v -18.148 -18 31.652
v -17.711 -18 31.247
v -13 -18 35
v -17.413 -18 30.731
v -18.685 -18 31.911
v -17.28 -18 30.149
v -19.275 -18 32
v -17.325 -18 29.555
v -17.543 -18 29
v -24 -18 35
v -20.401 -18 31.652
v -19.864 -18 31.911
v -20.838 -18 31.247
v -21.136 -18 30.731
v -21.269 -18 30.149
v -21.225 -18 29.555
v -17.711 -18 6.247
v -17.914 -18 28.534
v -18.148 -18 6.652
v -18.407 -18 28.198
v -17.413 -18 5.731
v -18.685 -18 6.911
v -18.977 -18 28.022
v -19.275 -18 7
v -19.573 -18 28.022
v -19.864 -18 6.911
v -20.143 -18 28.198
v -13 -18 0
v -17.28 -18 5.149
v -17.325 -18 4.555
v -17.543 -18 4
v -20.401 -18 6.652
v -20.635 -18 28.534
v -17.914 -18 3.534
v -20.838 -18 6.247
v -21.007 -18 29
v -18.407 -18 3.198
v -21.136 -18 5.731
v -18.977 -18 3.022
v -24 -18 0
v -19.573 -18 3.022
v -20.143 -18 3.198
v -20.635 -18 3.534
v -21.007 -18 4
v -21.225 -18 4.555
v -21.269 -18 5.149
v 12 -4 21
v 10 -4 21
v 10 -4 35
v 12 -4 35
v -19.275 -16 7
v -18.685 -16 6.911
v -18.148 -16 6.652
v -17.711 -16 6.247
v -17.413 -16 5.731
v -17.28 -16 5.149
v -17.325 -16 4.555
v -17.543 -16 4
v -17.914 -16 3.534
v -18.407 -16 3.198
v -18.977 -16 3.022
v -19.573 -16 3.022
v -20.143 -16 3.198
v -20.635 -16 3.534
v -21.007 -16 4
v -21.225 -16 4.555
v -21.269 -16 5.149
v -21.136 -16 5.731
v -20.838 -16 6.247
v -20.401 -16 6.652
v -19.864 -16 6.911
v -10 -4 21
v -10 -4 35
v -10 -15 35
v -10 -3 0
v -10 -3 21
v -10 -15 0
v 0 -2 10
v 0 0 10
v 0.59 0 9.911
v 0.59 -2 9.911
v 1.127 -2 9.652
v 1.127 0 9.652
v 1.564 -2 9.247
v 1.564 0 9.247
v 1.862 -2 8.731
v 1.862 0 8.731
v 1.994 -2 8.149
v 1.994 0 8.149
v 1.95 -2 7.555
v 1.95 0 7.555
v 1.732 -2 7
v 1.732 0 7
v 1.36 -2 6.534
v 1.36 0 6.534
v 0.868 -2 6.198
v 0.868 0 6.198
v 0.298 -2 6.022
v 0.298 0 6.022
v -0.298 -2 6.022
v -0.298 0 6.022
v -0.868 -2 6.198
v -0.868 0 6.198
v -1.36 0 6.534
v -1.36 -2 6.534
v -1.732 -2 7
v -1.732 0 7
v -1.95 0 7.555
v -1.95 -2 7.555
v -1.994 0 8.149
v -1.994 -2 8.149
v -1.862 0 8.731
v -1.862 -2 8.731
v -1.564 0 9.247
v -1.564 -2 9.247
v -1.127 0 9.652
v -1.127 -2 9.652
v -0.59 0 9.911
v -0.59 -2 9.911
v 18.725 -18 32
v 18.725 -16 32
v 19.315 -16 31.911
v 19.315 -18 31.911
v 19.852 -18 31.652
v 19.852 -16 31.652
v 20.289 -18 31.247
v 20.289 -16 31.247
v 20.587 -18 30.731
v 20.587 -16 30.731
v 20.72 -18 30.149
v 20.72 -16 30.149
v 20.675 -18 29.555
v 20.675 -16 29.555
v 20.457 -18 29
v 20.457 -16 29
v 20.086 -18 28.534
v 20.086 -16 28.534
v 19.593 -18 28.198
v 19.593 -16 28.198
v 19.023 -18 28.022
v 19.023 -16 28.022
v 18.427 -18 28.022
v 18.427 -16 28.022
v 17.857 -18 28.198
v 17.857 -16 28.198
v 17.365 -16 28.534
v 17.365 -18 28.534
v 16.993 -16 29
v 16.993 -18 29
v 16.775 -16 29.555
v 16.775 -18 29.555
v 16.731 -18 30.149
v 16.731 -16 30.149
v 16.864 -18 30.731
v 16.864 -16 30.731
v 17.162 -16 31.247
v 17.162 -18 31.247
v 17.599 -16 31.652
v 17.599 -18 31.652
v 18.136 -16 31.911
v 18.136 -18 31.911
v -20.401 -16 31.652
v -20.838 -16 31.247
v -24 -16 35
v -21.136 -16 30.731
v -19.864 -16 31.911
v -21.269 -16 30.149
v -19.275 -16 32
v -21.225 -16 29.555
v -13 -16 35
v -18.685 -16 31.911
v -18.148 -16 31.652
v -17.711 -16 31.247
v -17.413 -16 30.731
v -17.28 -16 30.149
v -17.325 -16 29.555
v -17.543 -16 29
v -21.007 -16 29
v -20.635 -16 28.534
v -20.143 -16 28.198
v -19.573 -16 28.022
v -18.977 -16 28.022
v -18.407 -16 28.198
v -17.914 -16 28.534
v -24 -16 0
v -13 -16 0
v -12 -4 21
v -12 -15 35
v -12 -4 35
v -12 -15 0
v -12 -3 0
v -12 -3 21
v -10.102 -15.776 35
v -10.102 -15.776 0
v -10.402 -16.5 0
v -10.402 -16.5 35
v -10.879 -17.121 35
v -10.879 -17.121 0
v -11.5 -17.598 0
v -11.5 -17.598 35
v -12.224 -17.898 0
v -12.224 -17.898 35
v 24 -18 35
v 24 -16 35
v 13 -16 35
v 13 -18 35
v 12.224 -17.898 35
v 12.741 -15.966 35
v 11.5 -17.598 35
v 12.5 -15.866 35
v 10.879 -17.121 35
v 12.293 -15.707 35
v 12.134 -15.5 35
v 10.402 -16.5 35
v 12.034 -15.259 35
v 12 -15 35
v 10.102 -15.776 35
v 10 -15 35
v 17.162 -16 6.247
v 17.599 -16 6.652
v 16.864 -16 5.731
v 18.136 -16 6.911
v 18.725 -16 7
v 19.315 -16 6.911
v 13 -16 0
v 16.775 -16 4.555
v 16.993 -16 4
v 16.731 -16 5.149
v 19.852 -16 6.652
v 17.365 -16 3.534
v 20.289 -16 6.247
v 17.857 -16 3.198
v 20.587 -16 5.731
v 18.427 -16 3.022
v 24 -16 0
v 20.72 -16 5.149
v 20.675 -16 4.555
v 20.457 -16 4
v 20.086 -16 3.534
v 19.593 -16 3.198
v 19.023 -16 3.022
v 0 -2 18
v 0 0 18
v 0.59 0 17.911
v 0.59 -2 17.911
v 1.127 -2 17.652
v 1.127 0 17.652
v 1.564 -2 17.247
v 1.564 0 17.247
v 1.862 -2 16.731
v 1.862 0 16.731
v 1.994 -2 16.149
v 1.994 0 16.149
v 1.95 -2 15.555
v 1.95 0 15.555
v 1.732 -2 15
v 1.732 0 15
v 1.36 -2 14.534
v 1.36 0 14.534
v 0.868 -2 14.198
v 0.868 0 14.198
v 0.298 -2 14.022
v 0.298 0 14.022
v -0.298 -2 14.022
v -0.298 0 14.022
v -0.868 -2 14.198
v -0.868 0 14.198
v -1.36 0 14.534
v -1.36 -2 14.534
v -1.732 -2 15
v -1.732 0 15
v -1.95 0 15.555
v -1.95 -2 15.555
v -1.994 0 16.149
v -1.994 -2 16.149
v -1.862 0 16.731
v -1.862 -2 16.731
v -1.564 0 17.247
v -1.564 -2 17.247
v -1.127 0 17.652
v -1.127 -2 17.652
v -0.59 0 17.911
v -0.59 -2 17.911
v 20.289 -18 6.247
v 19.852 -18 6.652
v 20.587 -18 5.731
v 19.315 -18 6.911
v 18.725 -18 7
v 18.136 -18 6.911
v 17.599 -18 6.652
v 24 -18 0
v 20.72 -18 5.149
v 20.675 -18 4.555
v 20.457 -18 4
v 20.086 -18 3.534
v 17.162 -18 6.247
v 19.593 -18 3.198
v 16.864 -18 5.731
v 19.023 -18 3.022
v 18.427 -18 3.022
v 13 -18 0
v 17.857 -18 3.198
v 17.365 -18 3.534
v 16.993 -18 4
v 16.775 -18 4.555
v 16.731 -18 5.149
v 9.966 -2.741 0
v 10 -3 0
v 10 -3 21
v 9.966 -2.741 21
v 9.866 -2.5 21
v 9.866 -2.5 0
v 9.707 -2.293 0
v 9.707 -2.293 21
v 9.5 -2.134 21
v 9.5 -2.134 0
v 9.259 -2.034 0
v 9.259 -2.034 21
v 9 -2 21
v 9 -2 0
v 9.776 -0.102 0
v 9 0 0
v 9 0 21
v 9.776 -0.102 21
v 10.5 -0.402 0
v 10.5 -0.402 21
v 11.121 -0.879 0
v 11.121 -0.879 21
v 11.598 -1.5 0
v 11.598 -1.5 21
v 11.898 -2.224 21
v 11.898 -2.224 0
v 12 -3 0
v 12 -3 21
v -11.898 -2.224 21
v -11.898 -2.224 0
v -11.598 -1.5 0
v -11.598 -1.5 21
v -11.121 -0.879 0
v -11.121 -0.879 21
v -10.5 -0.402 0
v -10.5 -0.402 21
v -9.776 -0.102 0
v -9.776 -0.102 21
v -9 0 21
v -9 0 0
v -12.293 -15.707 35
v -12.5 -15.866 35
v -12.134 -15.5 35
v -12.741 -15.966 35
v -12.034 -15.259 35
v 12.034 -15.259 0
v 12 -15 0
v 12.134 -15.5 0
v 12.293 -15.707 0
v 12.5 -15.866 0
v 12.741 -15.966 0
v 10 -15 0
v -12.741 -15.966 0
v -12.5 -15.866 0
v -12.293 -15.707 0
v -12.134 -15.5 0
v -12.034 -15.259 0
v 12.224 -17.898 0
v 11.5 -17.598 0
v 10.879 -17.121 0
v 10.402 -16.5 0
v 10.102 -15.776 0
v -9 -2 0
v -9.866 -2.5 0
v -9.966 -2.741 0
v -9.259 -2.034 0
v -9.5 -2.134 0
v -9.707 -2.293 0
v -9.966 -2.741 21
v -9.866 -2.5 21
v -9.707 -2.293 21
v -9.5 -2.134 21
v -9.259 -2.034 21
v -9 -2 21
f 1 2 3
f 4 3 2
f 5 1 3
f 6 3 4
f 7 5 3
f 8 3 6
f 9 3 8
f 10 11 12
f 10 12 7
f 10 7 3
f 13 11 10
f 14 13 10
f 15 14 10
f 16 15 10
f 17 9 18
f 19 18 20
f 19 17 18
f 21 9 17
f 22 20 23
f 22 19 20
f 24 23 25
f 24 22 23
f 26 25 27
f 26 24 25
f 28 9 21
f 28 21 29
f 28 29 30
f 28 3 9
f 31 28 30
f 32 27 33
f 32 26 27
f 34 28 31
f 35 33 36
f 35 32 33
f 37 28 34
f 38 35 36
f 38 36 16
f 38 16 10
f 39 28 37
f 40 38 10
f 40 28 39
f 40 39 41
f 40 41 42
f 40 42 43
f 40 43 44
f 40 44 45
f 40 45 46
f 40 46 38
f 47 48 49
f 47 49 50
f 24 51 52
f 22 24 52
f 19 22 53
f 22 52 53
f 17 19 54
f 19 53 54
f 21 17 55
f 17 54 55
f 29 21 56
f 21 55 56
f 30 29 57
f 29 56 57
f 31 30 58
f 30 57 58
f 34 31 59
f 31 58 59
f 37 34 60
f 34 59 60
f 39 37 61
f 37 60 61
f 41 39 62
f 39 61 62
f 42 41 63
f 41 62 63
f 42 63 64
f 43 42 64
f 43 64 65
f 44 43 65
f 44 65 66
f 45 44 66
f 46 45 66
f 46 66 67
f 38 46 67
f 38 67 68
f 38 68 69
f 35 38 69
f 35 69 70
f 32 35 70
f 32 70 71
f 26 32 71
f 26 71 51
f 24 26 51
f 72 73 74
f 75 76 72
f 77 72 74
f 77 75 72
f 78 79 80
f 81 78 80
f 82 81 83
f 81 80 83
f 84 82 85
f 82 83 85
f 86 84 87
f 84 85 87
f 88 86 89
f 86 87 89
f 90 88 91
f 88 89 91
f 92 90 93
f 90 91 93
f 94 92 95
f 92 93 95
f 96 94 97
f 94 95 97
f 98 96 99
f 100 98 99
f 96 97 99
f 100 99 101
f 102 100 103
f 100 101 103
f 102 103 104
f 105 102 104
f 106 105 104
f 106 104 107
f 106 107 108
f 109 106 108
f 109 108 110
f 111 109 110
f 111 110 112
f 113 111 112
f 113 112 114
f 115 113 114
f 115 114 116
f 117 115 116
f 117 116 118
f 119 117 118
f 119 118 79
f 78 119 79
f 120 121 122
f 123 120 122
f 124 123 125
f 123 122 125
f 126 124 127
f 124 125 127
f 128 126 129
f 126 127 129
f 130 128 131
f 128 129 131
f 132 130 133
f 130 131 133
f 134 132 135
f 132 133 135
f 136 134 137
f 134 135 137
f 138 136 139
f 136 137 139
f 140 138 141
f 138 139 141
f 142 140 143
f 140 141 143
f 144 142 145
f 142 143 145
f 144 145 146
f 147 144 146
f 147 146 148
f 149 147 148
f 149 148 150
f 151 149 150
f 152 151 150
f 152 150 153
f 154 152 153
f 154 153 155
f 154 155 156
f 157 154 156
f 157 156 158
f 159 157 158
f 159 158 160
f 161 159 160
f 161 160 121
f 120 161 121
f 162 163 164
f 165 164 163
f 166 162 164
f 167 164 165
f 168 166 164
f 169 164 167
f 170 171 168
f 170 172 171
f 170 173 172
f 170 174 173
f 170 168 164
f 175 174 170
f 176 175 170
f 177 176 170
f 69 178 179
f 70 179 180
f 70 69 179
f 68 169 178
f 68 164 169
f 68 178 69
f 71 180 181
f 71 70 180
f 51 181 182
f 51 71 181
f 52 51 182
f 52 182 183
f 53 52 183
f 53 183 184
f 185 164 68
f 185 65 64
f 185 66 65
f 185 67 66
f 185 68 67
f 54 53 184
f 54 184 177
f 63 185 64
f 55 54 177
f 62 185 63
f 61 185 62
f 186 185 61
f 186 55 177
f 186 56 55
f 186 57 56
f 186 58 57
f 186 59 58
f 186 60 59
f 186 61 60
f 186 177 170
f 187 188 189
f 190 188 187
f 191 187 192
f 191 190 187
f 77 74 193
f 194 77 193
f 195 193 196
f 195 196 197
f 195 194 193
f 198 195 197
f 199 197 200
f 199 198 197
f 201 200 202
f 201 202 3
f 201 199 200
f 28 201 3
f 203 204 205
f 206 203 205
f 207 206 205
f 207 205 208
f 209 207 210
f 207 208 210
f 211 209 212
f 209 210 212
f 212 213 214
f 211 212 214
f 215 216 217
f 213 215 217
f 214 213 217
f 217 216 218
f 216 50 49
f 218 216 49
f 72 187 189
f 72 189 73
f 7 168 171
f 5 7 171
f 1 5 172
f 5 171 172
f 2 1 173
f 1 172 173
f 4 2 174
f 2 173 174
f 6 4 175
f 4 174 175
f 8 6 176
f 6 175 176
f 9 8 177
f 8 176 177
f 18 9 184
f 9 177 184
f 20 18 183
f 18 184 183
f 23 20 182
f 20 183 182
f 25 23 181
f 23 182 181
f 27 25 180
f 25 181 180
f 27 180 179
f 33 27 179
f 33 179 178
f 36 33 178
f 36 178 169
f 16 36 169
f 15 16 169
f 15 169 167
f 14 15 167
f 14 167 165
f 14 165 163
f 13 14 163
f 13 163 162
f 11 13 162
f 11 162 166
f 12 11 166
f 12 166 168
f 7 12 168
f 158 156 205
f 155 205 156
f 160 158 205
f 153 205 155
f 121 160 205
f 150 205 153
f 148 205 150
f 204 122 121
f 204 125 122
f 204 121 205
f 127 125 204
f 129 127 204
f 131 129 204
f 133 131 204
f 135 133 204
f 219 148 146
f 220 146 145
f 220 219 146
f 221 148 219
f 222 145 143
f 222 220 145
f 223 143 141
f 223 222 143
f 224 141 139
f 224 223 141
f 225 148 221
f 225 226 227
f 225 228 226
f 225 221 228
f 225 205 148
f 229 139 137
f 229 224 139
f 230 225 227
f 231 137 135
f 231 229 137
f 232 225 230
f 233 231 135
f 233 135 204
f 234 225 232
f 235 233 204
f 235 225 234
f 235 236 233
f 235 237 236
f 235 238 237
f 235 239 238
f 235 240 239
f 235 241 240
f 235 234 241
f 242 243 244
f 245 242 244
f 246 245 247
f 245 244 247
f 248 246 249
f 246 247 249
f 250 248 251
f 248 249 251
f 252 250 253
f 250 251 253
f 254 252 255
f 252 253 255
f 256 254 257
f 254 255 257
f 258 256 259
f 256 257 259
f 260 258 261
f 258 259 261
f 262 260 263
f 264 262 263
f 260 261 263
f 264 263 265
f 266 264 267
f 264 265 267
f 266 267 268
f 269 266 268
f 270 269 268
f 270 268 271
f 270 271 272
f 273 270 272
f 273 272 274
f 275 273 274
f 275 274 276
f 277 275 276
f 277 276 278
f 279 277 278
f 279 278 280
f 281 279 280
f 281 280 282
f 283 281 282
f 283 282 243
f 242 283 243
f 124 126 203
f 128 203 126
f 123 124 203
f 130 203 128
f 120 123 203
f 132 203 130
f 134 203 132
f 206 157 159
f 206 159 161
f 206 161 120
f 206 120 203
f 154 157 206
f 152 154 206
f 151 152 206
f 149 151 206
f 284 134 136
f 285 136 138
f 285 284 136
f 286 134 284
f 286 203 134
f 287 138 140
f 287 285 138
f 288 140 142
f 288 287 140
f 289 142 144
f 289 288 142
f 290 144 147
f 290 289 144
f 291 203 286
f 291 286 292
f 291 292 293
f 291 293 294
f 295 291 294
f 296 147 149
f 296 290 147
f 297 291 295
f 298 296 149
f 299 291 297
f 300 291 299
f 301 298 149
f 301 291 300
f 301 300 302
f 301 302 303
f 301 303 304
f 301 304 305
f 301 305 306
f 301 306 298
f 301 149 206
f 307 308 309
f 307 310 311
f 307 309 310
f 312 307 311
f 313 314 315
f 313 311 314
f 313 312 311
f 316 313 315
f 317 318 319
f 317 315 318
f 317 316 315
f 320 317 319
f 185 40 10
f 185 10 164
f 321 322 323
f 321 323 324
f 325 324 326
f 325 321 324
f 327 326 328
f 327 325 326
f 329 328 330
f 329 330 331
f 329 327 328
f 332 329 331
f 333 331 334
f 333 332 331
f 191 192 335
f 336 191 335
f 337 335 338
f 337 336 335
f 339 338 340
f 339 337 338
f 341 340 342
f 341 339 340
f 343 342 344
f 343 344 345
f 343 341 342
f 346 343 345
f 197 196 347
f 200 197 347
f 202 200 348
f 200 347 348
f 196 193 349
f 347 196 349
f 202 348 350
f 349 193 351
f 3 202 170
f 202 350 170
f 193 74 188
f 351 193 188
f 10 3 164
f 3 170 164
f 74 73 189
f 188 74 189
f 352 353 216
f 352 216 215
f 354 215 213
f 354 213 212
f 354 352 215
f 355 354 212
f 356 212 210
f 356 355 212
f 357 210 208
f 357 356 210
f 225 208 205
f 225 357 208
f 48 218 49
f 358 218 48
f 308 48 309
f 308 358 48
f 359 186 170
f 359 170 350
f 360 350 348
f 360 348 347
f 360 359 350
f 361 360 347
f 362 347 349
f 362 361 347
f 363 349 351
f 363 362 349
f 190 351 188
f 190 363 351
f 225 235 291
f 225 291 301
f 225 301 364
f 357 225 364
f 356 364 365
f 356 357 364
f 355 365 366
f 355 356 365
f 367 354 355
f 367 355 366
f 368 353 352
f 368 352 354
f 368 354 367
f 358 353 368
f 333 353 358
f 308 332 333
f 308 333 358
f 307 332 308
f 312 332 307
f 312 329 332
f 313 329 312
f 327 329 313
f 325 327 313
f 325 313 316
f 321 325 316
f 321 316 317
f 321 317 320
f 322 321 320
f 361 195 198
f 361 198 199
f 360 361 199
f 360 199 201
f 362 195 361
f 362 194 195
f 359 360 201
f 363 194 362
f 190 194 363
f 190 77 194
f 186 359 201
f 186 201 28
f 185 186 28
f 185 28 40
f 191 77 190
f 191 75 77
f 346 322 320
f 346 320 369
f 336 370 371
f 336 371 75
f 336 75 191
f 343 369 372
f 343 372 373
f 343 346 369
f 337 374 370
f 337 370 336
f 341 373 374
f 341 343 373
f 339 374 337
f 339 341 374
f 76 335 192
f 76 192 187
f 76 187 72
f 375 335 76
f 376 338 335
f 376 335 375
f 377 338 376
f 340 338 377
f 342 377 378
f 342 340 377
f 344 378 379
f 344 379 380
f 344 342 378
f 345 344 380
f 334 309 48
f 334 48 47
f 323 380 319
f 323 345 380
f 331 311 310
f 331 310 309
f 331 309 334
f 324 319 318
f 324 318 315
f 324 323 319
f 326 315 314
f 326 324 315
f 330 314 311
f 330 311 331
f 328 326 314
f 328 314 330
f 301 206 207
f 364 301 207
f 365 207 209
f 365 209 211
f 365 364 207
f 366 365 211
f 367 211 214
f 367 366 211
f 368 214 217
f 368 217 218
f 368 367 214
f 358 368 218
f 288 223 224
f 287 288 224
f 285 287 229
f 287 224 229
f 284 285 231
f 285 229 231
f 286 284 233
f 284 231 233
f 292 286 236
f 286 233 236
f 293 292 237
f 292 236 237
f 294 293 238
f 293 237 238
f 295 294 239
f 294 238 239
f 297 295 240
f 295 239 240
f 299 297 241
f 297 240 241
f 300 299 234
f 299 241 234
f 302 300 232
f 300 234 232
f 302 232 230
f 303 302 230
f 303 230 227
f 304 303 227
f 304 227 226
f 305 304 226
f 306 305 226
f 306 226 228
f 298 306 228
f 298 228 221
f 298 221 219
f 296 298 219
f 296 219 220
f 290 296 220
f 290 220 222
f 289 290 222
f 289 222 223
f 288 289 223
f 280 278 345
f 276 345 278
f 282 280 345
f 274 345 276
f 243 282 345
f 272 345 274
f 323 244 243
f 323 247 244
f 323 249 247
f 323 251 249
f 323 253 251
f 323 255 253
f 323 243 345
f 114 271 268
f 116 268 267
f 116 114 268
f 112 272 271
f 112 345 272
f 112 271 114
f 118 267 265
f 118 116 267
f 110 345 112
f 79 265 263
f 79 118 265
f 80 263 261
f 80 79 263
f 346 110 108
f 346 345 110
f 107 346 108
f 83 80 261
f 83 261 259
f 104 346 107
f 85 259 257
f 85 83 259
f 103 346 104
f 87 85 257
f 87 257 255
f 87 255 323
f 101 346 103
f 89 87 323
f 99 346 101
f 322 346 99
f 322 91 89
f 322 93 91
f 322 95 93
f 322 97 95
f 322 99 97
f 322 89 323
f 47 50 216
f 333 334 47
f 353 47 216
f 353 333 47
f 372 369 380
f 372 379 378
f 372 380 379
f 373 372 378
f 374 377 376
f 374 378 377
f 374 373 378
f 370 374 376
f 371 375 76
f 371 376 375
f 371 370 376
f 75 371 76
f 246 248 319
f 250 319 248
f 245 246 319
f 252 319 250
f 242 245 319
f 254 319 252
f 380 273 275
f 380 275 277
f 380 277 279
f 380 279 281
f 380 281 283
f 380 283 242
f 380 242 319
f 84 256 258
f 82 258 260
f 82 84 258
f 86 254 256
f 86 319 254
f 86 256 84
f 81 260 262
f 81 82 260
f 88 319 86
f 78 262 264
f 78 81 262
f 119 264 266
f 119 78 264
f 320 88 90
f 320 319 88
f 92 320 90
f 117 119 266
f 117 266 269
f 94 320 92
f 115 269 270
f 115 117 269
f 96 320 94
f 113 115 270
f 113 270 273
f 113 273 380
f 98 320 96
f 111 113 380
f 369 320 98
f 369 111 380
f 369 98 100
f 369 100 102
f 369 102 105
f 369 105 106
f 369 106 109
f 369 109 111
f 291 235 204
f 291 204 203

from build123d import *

# Parameters (mm, degrees)
BASE_FLANGE2_DEPTH = 35
SKETCH12_W         = 24
SKETCH12_H         = 14
CUT_EXTRUDE1_DEPTH = 4
CUT_EXTRUDE2_REACH = 48.098
SKETCH13_R         = 2


# Sheet-metal steps are written as plain solids
with BuildPart() as part:
    # Sketch7 → Base-Flange2 (new body)
    with BuildSketch(Plane.XY):
        with BuildLine():
            Line((-24, -16), (-13, -16))
            ThreePointArc((-13, -16), (-12.292893219, -15.707106781), (-12, -15))
            Line((-12, -15), (-12, -3))
            ThreePointArc((-12, -3), (-11.121320344, -0.878679656), (-9, 0))
            Line((-9, 0), (9, 0))
            ThreePointArc((9, 0), (11.121320344, -0.878679656), (12, -3))
            Line((12, -3), (12, -15))
            ThreePointArc((12, -15), (12.292893219, -15.707106781), (13, -16))
            Line((13, -16), (24, -16))
            Line((24, -16), (24, -18))
            Line((24, -18), (13, -18))
            ThreePointArc((13, -18), (10.878679656, -17.121320344), (10, -15))
            Line((10, -15), (10, -3))
            ThreePointArc((10, -3), (9.707106781, -2.292893219), (9, -2))
            Line((9, -2), (-9, -2))
            ThreePointArc((-9, -2), (-9.707106781, -2.292893219), (-10, -3))
            Line((-10, -3), (-10, -15))
            ThreePointArc((-10, -15), (-10.878679656, -17.121320344), (-13, -18))
            Line((-13, -18), (-24, -18))
            Line((-24, -18), (-24, -16))
        make_face()
    extrude(amount=BASE_FLANGE2_DEPTH)

    # Sketch12 → Cut-Extrude1 (cut)
    with BuildSketch(Plane(origin=(0, 0, 0), x_dir=(1, 0, 0), z_dir=(0, 1, 0))):
        with Locations((0, -28)):
            Rectangle(SKETCH12_W, SKETCH12_H)
    extrude(amount=-CUT_EXTRUDE1_DEPTH, mode=Mode.SUBTRACT)

    # Sketch13 → Cut-Extrude2 (cut, up to next)
    with BuildSketch(Plane(origin=(0, 0, 0), x_dir=(1, 0, 0), z_dir=(0, 1, 0)), mode=Mode.PRIVATE) as cut_extrude2_sk1:
        with Locations(Location((18.725249298, -5, 0), (0, 0, 270))):
            Circle(SKETCH13_R)
    cut_extrude2_tool1 = extrude(cut_extrude2_sk1.sketch, amount=-CUT_EXTRUDE2_REACH, mode=Mode.PRIVATE) & part.part
    # Sketch13 → Cut-Extrude2 (cut, up to next)
    with BuildSketch(Plane(origin=(0, 0, 0), x_dir=(1, 0, 0), z_dir=(0, 1, 0)), mode=Mode.PRIVATE) as cut_extrude2_sk2:
        with Locations(Location((-19.274750702, -5, 0), (0, 0, 270))):
            Circle(SKETCH13_R)
    cut_extrude2_tool2 = extrude(cut_extrude2_sk2.sketch, amount=-CUT_EXTRUDE2_REACH, mode=Mode.PRIVATE) & part.part
    # Sketch13 → Cut-Extrude2 (cut, up to next)
    with BuildSketch(Plane(origin=(0, 0, 0), x_dir=(1, 0, 0), z_dir=(0, 1, 0)), mode=Mode.PRIVATE) as cut_extrude2_sk3:
        with Locations(Location((0, -8, 0), (0, 0, 270))):
            Circle(SKETCH13_R)
    cut_extrude2_tool3 = extrude(cut_extrude2_sk3.sketch, amount=-CUT_EXTRUDE2_REACH, mode=Mode.PRIVATE) & part.part
    # Sketch13 → Cut-Extrude2 (cut, up to next)
    with BuildSketch(Plane(origin=(0, 0, 0), x_dir=(1, 0, 0), z_dir=(0, 1, 0)), mode=Mode.PRIVATE) as cut_extrude2_sk4:
        with Locations(Location((0, -16, 0), (0, 0, 270))):
            Circle(SKETCH13_R)
    cut_extrude2_tool4 = extrude(cut_extrude2_sk4.sketch, amount=-CUT_EXTRUDE2_REACH, mode=Mode.PRIVATE) & part.part
    # Sketch13 → Cut-Extrude2 (cut, up to next)
    with BuildSketch(Plane(origin=(0, 0, 0), x_dir=(1, 0, 0), z_dir=(0, 1, 0)), mode=Mode.PRIVATE) as cut_extrude2_sk5:
        with Locations(Location((18.725249298, -30, 0), (0, 0, 270))):
            Circle(SKETCH13_R)
    cut_extrude2_tool5 = extrude(cut_extrude2_sk5.sketch, amount=-CUT_EXTRUDE2_REACH, mode=Mode.PRIVATE) & part.part
    # Sketch13 → Cut-Extrude2 (cut, up to next)
    with BuildSketch(Plane(origin=(0, 0, 0), x_dir=(1, 0, 0), z_dir=(0, 1, 0)), mode=Mode.PRIVATE) as cut_extrude2_sk6:
        with Locations(Location((-19.274750702, -30, 0), (0, 0, 270))):
            Circle(SKETCH13_R)
    cut_extrude2_tool6 = extrude(cut_extrude2_sk6.sketch, amount=-CUT_EXTRUDE2_REACH, mode=Mode.PRIVATE) & part.part
    add(cut_extrude2_tool1.solids().sort_by_distance((18.725249, 0, 5))[0], mode=Mode.SUBTRACT)
    add(cut_extrude2_tool2.solids().sort_by_distance((-19.274751, 0, 5))[0], mode=Mode.SUBTRACT)
    add(cut_extrude2_tool3.solids().sort_by_distance((0, 0, 8))[0], mode=Mode.SUBTRACT)
    add(cut_extrude2_tool4.solids().sort_by_distance((0, 0, 16))[0], mode=Mode.SUBTRACT)
    add(cut_extrude2_tool5.solids().sort_by_distance((18.725249, 0, 30))[0], mode=Mode.SUBTRACT)
    add(cut_extrude2_tool6.solids().sort_by_distance((-19.274751, 0, 30))[0], mode=Mode.SUBTRACT)


solid = part.part
